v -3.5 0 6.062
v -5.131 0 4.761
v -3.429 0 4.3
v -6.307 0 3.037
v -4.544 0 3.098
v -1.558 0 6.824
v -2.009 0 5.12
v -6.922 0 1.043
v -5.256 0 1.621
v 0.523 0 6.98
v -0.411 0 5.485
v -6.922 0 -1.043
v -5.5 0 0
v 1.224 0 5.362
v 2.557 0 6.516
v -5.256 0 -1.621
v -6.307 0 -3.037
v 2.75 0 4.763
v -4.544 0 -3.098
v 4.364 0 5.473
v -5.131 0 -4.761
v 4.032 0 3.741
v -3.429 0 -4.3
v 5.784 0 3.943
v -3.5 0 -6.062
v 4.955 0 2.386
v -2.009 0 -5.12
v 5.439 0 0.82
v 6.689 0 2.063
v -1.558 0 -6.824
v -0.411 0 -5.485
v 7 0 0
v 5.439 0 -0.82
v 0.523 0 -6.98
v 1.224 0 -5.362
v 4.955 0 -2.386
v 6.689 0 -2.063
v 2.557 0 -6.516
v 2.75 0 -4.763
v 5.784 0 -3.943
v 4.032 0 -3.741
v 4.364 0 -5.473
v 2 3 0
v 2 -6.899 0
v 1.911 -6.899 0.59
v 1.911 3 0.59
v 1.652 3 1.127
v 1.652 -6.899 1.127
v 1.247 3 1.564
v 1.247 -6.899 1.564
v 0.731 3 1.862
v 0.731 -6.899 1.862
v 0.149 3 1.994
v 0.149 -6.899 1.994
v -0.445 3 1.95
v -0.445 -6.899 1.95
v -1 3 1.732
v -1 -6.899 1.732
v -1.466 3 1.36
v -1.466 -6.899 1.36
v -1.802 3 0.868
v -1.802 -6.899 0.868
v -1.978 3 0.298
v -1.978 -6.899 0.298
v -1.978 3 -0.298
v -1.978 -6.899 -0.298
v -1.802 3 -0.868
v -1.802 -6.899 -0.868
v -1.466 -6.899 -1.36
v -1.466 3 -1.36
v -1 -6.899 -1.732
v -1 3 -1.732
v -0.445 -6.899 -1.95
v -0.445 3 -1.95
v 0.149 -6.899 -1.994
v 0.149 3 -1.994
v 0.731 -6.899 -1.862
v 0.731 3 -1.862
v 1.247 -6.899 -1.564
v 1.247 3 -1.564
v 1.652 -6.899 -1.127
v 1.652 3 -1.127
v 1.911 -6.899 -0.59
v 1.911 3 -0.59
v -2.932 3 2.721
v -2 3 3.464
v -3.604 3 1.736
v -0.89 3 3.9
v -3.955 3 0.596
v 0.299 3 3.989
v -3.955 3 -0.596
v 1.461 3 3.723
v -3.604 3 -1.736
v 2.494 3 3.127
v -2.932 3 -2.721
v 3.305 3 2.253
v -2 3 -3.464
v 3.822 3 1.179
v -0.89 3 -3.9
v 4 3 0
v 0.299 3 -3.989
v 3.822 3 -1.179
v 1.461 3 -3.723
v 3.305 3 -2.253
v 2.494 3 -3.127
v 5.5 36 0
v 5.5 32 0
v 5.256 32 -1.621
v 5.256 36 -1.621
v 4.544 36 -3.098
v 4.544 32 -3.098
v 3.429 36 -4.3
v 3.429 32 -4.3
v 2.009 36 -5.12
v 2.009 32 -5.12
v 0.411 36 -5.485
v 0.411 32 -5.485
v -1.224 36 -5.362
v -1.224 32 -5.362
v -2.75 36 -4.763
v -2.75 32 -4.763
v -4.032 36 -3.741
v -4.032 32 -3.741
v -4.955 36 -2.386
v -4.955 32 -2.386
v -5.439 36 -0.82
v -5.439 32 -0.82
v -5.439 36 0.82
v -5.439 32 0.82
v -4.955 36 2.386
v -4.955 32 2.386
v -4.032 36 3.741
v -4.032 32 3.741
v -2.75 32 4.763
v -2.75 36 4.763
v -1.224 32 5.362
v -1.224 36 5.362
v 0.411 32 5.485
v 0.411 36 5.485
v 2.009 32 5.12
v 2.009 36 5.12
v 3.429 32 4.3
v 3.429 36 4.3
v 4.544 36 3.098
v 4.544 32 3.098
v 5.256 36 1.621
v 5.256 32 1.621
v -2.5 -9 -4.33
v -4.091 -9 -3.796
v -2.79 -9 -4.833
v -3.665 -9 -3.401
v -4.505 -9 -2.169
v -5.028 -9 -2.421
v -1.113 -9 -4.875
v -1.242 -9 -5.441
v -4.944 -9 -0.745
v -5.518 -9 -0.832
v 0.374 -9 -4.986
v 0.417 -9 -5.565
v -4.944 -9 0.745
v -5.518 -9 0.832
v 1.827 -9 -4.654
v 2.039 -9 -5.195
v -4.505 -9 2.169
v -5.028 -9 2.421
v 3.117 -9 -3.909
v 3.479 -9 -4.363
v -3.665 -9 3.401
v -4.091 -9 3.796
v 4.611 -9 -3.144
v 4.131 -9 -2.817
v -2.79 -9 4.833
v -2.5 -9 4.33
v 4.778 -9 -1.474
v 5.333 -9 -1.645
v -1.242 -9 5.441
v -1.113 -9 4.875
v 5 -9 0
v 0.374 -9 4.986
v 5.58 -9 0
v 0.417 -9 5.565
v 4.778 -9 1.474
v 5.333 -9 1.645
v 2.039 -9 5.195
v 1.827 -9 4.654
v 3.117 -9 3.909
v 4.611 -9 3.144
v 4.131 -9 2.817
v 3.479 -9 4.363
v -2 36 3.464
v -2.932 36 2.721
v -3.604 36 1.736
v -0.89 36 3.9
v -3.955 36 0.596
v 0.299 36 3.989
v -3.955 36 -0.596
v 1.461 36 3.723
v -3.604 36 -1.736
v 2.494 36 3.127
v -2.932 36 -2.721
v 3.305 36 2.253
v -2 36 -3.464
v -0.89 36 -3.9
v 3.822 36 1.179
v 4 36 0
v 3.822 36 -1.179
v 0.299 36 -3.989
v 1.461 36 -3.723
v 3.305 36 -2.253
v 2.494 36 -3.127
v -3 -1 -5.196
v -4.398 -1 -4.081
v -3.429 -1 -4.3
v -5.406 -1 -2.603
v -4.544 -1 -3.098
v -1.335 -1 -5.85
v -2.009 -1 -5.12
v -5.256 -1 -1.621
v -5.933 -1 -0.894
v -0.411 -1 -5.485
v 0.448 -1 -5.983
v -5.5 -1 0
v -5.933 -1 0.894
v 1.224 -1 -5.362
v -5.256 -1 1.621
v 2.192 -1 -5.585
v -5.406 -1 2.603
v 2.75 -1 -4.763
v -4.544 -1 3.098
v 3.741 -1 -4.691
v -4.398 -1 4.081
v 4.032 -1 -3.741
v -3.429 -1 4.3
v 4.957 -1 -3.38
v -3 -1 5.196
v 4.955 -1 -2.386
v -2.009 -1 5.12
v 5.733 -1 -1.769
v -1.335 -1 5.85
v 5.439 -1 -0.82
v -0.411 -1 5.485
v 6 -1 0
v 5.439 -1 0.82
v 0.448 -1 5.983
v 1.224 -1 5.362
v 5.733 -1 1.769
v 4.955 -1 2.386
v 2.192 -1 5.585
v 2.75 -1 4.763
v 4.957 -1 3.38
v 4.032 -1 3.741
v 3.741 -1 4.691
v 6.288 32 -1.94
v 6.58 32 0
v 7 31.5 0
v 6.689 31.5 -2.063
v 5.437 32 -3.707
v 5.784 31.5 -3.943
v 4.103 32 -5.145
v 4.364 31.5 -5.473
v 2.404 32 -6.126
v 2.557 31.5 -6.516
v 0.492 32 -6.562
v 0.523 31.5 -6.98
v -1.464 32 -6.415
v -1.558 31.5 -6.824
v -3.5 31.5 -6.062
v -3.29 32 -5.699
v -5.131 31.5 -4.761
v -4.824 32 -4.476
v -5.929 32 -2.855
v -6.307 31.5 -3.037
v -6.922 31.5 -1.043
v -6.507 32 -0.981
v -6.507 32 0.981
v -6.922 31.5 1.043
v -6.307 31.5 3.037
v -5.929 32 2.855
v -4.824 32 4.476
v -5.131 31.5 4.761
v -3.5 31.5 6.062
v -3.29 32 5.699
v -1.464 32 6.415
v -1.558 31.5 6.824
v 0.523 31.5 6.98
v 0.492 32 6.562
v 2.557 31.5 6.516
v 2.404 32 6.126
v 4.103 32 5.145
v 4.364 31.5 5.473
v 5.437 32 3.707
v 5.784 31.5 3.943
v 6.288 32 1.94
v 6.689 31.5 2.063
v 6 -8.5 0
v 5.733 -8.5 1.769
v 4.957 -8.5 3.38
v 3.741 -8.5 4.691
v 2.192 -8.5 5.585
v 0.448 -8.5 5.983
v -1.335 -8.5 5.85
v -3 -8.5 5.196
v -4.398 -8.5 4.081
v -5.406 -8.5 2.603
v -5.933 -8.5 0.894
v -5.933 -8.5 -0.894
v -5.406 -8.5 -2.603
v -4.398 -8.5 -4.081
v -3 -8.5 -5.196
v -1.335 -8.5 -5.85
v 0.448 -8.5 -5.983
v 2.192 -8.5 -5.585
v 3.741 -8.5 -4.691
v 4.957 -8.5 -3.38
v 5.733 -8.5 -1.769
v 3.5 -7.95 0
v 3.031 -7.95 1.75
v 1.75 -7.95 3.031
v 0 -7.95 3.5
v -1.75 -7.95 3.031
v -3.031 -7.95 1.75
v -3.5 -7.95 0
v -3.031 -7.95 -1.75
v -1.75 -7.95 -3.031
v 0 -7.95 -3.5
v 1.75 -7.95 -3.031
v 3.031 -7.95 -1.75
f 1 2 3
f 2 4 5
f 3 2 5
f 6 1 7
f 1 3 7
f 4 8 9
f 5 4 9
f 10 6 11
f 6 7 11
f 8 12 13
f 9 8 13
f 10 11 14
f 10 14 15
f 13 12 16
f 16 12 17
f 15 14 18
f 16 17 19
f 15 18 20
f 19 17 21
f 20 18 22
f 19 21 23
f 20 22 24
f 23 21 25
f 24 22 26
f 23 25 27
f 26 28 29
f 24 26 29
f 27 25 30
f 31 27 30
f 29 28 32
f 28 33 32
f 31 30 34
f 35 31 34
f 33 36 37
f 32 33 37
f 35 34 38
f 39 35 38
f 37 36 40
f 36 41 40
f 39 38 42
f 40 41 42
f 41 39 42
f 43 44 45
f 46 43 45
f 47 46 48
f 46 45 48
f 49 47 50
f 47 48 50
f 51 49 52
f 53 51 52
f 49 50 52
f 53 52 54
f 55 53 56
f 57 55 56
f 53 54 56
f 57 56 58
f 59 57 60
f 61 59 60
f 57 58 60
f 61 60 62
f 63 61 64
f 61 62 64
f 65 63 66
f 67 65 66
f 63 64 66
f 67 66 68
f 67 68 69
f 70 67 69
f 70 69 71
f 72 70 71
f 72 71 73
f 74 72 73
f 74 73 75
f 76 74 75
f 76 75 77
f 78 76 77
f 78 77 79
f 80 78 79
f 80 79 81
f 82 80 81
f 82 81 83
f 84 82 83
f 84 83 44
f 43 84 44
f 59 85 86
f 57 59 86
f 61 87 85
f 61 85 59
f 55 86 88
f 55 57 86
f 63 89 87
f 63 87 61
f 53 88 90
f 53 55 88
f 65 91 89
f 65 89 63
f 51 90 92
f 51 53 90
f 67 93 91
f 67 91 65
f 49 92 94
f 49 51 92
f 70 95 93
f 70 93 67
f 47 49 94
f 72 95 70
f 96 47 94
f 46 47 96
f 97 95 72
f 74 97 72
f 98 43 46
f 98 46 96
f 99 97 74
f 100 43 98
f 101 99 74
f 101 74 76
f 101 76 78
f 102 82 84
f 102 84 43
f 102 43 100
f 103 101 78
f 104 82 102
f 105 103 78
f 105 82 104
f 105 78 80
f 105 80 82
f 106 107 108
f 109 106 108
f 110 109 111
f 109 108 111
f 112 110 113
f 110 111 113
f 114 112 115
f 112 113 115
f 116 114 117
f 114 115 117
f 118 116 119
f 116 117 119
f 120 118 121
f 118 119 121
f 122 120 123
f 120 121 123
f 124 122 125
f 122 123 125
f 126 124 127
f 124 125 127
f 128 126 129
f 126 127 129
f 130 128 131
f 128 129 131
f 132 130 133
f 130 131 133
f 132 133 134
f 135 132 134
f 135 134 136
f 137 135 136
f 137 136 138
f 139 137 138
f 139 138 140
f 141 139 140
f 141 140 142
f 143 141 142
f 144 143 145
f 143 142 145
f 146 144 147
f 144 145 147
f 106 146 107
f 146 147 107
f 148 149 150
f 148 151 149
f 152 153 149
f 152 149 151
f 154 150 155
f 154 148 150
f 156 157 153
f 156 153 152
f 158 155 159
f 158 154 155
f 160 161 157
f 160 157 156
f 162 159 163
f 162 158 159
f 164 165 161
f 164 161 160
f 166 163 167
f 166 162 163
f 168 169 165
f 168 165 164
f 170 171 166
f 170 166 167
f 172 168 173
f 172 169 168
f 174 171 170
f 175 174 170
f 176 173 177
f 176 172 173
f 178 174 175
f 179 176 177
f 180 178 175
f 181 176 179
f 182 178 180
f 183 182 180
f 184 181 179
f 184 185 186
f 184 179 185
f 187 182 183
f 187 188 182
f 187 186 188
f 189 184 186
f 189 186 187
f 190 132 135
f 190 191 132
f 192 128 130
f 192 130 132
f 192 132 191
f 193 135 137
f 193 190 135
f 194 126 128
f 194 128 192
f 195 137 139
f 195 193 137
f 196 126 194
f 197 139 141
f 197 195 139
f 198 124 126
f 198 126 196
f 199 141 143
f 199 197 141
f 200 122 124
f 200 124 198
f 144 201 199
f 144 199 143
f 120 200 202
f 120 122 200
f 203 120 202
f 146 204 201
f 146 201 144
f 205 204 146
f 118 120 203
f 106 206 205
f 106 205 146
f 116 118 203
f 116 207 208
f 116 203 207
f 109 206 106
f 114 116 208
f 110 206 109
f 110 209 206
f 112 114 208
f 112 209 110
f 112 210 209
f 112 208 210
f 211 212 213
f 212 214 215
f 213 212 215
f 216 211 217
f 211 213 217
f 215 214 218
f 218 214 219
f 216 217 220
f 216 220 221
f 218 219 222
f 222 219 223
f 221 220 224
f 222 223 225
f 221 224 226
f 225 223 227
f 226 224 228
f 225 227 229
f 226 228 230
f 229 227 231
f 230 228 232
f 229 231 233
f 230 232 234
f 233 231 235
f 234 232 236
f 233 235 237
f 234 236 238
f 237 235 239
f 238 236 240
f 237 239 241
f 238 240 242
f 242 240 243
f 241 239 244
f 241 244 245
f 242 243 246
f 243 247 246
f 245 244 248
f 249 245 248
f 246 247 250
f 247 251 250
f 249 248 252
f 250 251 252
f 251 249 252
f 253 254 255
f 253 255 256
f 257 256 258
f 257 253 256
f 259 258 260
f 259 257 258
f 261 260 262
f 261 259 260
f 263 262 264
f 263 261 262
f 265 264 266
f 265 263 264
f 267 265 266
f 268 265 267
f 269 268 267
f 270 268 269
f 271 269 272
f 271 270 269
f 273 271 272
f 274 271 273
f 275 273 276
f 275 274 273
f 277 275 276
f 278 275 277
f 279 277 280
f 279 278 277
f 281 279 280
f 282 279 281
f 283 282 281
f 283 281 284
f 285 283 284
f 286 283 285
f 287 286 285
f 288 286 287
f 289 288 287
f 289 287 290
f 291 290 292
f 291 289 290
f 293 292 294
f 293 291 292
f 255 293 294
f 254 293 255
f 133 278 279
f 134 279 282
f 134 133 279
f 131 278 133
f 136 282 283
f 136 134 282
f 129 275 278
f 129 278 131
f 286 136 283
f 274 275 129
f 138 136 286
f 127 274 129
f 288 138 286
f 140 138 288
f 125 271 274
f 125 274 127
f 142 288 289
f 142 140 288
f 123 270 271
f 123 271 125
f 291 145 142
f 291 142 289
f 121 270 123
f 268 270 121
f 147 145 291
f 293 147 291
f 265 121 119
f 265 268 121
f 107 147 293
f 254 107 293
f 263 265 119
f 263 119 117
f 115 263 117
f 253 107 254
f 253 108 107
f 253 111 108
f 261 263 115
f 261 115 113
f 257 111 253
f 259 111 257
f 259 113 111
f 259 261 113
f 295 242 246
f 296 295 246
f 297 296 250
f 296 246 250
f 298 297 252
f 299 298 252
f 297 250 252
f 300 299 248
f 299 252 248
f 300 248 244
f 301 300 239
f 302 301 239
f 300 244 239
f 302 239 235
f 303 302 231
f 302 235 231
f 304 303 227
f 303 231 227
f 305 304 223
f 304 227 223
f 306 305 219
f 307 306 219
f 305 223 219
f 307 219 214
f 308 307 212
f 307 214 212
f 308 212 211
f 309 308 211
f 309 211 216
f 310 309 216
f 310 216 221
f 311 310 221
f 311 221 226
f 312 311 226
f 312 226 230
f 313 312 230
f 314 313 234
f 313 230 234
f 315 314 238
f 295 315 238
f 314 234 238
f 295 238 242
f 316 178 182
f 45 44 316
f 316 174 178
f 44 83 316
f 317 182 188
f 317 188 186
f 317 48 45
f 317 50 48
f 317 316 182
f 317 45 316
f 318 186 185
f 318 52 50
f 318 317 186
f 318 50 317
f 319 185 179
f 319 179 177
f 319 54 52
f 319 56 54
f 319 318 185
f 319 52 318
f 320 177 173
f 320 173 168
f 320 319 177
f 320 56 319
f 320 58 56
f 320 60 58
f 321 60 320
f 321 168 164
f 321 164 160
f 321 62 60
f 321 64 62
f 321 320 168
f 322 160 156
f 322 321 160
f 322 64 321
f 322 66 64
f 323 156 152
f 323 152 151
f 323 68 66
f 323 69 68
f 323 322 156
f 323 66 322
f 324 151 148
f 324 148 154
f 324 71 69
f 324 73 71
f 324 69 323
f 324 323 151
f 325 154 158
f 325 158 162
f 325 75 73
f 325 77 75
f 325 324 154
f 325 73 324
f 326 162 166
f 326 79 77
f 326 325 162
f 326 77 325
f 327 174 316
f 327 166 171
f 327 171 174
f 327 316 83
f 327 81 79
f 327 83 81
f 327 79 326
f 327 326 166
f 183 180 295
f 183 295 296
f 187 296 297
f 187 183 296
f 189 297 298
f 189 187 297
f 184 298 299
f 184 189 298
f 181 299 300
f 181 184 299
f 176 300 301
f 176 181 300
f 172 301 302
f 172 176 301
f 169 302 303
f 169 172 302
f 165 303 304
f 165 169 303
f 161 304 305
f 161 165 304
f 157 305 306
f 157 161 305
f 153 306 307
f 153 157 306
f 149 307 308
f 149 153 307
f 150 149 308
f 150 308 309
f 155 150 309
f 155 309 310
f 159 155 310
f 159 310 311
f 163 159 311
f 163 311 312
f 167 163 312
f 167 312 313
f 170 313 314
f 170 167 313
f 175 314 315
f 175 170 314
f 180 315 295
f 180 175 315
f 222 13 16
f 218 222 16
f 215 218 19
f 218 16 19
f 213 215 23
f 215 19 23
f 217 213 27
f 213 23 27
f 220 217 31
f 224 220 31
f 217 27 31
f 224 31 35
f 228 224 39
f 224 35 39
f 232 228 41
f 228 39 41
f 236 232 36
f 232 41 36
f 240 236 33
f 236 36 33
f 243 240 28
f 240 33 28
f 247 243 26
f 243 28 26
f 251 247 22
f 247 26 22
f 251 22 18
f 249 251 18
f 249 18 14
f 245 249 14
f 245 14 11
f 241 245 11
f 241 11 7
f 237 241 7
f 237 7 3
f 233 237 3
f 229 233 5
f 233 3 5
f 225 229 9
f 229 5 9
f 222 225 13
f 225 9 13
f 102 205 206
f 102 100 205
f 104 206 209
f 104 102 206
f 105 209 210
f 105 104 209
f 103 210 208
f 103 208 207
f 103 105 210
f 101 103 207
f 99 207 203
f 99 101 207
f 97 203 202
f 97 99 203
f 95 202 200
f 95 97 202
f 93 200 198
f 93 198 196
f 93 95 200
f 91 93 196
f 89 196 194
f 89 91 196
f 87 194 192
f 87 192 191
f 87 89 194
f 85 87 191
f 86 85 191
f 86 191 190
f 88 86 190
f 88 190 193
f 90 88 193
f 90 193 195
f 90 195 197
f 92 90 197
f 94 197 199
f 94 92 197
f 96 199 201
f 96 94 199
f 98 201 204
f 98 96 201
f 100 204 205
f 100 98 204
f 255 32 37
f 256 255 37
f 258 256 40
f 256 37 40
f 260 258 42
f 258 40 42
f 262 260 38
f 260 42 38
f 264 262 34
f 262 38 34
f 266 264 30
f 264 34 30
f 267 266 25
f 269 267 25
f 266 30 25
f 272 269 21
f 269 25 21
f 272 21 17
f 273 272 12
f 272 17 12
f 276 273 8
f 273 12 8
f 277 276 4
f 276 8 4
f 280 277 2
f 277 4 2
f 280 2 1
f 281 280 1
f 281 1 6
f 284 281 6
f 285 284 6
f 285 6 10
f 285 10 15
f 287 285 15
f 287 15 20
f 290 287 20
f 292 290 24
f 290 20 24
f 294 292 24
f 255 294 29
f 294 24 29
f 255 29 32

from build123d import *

# Parameters (mm, degrees)
CROQUIS1_R              = 7
CROQUIS1_R_2            = 4
SALIENTE_EXTRUIR1_DEPTH = 32
CROQUIS2_R              = 4
SALIENTE_EXTRUIR2_DEPTH = 3
CROQUIS3_R              = 5.5
SALIENTE_EXTRUIR3_DEPTH = 1
CROQUIS4_R              = 6
SALIENTE_EXTRUIR4_DEPTH = 8
CROQUIS5_R              = 2
CORTAR_EXTRUIR1_DEPTH   = 34
CHAFL_N1_SIZE           = 3
CHAFL_N1_SIZE2          = 2.100622615
CHAFL_N2_SIZE           = 0.5
CHAFL_N2_SIZE2          = 0.419549816
CHAFL_N3_SIZE           = 0.5
CHAFL_N3_SIZE2          = 0.419549816
CROQUIS6_R              = 5.5
CROQUIS6_R_2            = 4
SALIENTE_EXTRUIR5_DEPTH = 4


with BuildPart() as part:
    # Croquis1 → Saliente-Extruir1 (new body)
    with BuildSketch(Plane(origin=(0, 0, 0), x_dir=(1, 0, 0), z_dir=(0, 1, 0))):
        Circle(CROQUIS1_R)
        Circle(CROQUIS1_R_2, mode=Mode.SUBTRACT)
    extrude(amount=SALIENTE_EXTRUIR1_DEPTH)

    # Croquis2 → Saliente-Extruir2 (add)
    with BuildSketch(Plane(origin=(0, 3, 0), x_dir=(1, 0, 0), z_dir=(0, 1, 0))):
        Circle(CROQUIS2_R)
    extrude(amount=-SALIENTE_EXTRUIR2_DEPTH)

    # Croquis3 → Saliente-Extruir3 (add)
    with BuildSketch(Plane(origin=(0, 0, 0), x_dir=(-1, 0, 0), z_dir=(0, -1, 0))):
        Circle(CROQUIS3_R)
    extrude(amount=SALIENTE_EXTRUIR3_DEPTH)

    # Croquis4 → Saliente-Extruir4 (add)
    with BuildSketch(Plane.XZ.offset(1)):
        Circle(CROQUIS4_R)
    extrude(amount=SALIENTE_EXTRUIR4_DEPTH)

    # Croquis5 → Cortar-Extruir1 (cut)
    with BuildSketch(Plane.XZ.offset(9)):
        Circle(CROQUIS5_R)
    extrude(amount=-CORTAR_EXTRUIR1_DEPTH, mode=Mode.SUBTRACT)

    # Chaflán1
    chafl_n1_edges = [part.edges().sort_by_distance(p)[0] for p in [
        (-2, -9, 0),
    ]]
    chafl_n1_side = [part.faces().sort_by_distance(p)[0] for p in [
        (-5.830294373, -9, 0),
    ]]
    chamfer(chafl_n1_edges, length=CHAFL_N1_SIZE, length2=CHAFL_N1_SIZE2, reference=chafl_n1_side[0])

    # Chaflán2
    chafl_n2_edges = [part.edges().sort_by_distance(p)[0] for p in [
        (-6, -9, 0),
    ]]
    chafl_n2_side = [part.faces().sort_by_distance(p)[0] for p in [
        (-6, -5, 0),
    ]]
    chamfer(chafl_n2_edges, length=CHAFL_N2_SIZE, length2=CHAFL_N2_SIZE2, reference=chafl_n2_side[0])

    # Chaflán3
    chafl_n3_edges = [part.edges().sort_by_distance(p)[0] for p in [
        (-7, 32, 0),
    ]]
    chafl_n3_side = [part.faces().sort_by_distance(p)[0] for p in [
        (-7, 16, 0),
    ]]
    chamfer(chafl_n3_edges, length=CHAFL_N3_SIZE, length2=CHAFL_N3_SIZE2, reference=chafl_n3_side[0])

    # Croquis6 → Saliente-Extruir5 (add)
    with BuildSketch(Plane(origin=(0, 32, 0), x_dir=(1, 0, 0), z_dir=(0, 1, 0))):
        Circle(CROQUIS6_R)
        Circle(CROQUIS6_R_2, mode=Mode.SUBTRACT)
    extrude(amount=SALIENTE_EXTRUIR5_DEPTH)


solid = part.part
